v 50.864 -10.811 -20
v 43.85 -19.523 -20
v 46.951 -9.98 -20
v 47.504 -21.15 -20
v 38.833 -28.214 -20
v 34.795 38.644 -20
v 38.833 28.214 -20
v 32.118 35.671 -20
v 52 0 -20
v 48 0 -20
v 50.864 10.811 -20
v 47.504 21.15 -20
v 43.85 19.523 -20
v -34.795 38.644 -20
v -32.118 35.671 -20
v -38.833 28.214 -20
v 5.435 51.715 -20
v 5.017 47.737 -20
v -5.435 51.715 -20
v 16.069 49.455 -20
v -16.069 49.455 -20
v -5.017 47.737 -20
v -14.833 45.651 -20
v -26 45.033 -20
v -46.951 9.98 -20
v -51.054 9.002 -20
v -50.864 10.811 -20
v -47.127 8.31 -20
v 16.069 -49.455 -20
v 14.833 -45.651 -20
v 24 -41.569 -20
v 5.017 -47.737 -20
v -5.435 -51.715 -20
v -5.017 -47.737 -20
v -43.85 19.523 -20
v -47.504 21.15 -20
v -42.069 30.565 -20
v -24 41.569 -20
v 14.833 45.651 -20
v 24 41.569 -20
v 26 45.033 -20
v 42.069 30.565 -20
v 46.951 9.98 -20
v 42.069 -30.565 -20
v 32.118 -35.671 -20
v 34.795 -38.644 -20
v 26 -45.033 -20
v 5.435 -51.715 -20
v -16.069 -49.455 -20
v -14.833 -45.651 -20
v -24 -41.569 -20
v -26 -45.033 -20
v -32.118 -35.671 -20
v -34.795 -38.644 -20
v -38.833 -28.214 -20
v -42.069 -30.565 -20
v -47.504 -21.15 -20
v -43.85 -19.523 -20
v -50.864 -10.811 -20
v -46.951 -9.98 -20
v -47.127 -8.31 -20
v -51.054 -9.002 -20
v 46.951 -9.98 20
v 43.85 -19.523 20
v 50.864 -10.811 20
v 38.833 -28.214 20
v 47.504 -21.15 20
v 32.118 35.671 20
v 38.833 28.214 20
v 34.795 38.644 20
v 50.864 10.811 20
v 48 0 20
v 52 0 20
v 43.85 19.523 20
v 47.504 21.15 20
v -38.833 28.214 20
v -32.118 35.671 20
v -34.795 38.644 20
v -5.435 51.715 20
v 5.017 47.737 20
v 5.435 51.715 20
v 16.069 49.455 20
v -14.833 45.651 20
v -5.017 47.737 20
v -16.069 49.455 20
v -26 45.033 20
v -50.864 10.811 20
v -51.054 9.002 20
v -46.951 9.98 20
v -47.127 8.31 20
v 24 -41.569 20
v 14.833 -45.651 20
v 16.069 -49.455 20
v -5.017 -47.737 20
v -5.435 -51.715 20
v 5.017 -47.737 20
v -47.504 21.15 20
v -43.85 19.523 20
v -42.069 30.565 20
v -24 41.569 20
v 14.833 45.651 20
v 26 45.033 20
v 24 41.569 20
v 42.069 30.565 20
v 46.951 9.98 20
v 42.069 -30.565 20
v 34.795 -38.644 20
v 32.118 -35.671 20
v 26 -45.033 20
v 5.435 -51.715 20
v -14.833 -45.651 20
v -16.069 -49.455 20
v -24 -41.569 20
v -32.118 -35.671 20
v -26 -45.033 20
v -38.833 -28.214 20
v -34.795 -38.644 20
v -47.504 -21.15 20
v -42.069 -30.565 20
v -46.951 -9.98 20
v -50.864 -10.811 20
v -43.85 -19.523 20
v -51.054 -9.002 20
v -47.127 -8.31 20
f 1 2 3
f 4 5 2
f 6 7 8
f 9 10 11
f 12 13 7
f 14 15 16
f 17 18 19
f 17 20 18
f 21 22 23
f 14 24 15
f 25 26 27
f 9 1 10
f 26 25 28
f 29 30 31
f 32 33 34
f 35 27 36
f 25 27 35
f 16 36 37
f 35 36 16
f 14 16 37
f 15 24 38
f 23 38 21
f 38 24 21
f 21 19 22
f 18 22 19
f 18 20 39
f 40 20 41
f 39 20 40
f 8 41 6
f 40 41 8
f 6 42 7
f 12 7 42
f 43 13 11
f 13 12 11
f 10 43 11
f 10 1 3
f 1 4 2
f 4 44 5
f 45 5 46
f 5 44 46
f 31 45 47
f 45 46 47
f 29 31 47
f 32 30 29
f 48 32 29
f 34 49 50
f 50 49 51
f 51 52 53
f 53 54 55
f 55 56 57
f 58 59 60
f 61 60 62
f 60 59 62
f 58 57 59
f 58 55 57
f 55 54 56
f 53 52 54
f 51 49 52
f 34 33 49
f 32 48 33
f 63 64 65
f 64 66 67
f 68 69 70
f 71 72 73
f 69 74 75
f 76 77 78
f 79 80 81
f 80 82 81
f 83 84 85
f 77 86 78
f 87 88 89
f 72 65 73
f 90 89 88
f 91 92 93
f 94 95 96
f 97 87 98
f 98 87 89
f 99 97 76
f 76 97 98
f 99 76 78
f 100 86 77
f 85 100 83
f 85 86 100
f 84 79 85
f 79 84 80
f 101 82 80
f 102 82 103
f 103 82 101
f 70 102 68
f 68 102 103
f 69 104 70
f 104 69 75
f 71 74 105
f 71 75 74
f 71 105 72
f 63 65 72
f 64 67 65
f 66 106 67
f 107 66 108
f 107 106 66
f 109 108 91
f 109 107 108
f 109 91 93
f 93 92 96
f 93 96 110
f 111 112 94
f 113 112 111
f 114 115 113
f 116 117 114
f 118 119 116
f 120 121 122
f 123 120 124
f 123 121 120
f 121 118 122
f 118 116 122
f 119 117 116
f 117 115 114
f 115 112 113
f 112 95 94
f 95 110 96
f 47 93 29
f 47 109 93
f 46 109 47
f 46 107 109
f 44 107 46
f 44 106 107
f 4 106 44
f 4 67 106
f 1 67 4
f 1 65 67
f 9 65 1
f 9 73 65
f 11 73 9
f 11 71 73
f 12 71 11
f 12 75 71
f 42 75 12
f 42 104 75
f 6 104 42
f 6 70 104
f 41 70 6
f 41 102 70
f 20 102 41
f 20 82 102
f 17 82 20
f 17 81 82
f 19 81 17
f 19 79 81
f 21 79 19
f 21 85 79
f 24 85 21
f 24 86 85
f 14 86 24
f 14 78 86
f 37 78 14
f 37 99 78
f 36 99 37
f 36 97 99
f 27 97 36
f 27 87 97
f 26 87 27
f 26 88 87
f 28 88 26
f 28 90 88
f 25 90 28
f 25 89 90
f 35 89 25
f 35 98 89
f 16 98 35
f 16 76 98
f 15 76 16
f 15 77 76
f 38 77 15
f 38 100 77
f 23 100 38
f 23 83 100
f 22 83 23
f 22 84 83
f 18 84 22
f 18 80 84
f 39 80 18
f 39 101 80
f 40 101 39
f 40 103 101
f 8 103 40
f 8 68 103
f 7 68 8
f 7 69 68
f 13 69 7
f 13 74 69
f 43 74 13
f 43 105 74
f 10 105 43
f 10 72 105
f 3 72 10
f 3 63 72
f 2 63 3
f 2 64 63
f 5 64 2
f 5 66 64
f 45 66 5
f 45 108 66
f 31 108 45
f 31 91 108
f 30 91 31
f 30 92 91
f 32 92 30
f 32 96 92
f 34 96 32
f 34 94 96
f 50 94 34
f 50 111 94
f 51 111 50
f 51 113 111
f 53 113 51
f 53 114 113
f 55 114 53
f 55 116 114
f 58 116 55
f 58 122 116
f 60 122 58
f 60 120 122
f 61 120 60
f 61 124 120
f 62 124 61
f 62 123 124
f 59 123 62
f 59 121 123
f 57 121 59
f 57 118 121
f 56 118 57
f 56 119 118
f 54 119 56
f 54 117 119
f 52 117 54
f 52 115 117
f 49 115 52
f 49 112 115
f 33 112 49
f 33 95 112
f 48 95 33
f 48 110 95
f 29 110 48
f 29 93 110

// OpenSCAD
//arc module from https://www.thingiverse.com/thing:1092611
module arc(radius, thick, angle){
	intersection(){
		union(){
			rights = floor(angle/90);
			remain = angle-rights*90;
			if(angle > 90){
				for(i = [0:rights-1]){
					rotate(i*90-(rights-1)*90/2){
						polygon([[0, 0], [radius+thick, (radius+thick)*tan(90/2)], [radius+thick, -(radius+thick)*tan(90/2)]]);
					}
				}
				rotate(-(rights)*90/2)
					polygon([[0, 0], [radius+thick, 0], [radius+thick, -(radius+thick)*tan(remain/2)]]);
				rotate((rights)*90/2)
					polygon([[0, 0], [radius+thick, (radius+thick)*tan(remain/2)], [radius+thick, 0]]);
			}else{
				polygon([[0, 0], [radius+thick, (radius+thick)*tan(angle/2)], [radius+thick, -(radius+thick)*tan(angle/2)]]);
			}
		}
		difference(){
			circle(radius+thick);
			circle(radius);
		}
	}
}
ex_diam = 52;
int_diam = 48;
height = 40;
linear_extrude(height = height, center = true, convexity = 0, twist = 0)
    arc(int_diam, ex_diam-int_diam, 340);
